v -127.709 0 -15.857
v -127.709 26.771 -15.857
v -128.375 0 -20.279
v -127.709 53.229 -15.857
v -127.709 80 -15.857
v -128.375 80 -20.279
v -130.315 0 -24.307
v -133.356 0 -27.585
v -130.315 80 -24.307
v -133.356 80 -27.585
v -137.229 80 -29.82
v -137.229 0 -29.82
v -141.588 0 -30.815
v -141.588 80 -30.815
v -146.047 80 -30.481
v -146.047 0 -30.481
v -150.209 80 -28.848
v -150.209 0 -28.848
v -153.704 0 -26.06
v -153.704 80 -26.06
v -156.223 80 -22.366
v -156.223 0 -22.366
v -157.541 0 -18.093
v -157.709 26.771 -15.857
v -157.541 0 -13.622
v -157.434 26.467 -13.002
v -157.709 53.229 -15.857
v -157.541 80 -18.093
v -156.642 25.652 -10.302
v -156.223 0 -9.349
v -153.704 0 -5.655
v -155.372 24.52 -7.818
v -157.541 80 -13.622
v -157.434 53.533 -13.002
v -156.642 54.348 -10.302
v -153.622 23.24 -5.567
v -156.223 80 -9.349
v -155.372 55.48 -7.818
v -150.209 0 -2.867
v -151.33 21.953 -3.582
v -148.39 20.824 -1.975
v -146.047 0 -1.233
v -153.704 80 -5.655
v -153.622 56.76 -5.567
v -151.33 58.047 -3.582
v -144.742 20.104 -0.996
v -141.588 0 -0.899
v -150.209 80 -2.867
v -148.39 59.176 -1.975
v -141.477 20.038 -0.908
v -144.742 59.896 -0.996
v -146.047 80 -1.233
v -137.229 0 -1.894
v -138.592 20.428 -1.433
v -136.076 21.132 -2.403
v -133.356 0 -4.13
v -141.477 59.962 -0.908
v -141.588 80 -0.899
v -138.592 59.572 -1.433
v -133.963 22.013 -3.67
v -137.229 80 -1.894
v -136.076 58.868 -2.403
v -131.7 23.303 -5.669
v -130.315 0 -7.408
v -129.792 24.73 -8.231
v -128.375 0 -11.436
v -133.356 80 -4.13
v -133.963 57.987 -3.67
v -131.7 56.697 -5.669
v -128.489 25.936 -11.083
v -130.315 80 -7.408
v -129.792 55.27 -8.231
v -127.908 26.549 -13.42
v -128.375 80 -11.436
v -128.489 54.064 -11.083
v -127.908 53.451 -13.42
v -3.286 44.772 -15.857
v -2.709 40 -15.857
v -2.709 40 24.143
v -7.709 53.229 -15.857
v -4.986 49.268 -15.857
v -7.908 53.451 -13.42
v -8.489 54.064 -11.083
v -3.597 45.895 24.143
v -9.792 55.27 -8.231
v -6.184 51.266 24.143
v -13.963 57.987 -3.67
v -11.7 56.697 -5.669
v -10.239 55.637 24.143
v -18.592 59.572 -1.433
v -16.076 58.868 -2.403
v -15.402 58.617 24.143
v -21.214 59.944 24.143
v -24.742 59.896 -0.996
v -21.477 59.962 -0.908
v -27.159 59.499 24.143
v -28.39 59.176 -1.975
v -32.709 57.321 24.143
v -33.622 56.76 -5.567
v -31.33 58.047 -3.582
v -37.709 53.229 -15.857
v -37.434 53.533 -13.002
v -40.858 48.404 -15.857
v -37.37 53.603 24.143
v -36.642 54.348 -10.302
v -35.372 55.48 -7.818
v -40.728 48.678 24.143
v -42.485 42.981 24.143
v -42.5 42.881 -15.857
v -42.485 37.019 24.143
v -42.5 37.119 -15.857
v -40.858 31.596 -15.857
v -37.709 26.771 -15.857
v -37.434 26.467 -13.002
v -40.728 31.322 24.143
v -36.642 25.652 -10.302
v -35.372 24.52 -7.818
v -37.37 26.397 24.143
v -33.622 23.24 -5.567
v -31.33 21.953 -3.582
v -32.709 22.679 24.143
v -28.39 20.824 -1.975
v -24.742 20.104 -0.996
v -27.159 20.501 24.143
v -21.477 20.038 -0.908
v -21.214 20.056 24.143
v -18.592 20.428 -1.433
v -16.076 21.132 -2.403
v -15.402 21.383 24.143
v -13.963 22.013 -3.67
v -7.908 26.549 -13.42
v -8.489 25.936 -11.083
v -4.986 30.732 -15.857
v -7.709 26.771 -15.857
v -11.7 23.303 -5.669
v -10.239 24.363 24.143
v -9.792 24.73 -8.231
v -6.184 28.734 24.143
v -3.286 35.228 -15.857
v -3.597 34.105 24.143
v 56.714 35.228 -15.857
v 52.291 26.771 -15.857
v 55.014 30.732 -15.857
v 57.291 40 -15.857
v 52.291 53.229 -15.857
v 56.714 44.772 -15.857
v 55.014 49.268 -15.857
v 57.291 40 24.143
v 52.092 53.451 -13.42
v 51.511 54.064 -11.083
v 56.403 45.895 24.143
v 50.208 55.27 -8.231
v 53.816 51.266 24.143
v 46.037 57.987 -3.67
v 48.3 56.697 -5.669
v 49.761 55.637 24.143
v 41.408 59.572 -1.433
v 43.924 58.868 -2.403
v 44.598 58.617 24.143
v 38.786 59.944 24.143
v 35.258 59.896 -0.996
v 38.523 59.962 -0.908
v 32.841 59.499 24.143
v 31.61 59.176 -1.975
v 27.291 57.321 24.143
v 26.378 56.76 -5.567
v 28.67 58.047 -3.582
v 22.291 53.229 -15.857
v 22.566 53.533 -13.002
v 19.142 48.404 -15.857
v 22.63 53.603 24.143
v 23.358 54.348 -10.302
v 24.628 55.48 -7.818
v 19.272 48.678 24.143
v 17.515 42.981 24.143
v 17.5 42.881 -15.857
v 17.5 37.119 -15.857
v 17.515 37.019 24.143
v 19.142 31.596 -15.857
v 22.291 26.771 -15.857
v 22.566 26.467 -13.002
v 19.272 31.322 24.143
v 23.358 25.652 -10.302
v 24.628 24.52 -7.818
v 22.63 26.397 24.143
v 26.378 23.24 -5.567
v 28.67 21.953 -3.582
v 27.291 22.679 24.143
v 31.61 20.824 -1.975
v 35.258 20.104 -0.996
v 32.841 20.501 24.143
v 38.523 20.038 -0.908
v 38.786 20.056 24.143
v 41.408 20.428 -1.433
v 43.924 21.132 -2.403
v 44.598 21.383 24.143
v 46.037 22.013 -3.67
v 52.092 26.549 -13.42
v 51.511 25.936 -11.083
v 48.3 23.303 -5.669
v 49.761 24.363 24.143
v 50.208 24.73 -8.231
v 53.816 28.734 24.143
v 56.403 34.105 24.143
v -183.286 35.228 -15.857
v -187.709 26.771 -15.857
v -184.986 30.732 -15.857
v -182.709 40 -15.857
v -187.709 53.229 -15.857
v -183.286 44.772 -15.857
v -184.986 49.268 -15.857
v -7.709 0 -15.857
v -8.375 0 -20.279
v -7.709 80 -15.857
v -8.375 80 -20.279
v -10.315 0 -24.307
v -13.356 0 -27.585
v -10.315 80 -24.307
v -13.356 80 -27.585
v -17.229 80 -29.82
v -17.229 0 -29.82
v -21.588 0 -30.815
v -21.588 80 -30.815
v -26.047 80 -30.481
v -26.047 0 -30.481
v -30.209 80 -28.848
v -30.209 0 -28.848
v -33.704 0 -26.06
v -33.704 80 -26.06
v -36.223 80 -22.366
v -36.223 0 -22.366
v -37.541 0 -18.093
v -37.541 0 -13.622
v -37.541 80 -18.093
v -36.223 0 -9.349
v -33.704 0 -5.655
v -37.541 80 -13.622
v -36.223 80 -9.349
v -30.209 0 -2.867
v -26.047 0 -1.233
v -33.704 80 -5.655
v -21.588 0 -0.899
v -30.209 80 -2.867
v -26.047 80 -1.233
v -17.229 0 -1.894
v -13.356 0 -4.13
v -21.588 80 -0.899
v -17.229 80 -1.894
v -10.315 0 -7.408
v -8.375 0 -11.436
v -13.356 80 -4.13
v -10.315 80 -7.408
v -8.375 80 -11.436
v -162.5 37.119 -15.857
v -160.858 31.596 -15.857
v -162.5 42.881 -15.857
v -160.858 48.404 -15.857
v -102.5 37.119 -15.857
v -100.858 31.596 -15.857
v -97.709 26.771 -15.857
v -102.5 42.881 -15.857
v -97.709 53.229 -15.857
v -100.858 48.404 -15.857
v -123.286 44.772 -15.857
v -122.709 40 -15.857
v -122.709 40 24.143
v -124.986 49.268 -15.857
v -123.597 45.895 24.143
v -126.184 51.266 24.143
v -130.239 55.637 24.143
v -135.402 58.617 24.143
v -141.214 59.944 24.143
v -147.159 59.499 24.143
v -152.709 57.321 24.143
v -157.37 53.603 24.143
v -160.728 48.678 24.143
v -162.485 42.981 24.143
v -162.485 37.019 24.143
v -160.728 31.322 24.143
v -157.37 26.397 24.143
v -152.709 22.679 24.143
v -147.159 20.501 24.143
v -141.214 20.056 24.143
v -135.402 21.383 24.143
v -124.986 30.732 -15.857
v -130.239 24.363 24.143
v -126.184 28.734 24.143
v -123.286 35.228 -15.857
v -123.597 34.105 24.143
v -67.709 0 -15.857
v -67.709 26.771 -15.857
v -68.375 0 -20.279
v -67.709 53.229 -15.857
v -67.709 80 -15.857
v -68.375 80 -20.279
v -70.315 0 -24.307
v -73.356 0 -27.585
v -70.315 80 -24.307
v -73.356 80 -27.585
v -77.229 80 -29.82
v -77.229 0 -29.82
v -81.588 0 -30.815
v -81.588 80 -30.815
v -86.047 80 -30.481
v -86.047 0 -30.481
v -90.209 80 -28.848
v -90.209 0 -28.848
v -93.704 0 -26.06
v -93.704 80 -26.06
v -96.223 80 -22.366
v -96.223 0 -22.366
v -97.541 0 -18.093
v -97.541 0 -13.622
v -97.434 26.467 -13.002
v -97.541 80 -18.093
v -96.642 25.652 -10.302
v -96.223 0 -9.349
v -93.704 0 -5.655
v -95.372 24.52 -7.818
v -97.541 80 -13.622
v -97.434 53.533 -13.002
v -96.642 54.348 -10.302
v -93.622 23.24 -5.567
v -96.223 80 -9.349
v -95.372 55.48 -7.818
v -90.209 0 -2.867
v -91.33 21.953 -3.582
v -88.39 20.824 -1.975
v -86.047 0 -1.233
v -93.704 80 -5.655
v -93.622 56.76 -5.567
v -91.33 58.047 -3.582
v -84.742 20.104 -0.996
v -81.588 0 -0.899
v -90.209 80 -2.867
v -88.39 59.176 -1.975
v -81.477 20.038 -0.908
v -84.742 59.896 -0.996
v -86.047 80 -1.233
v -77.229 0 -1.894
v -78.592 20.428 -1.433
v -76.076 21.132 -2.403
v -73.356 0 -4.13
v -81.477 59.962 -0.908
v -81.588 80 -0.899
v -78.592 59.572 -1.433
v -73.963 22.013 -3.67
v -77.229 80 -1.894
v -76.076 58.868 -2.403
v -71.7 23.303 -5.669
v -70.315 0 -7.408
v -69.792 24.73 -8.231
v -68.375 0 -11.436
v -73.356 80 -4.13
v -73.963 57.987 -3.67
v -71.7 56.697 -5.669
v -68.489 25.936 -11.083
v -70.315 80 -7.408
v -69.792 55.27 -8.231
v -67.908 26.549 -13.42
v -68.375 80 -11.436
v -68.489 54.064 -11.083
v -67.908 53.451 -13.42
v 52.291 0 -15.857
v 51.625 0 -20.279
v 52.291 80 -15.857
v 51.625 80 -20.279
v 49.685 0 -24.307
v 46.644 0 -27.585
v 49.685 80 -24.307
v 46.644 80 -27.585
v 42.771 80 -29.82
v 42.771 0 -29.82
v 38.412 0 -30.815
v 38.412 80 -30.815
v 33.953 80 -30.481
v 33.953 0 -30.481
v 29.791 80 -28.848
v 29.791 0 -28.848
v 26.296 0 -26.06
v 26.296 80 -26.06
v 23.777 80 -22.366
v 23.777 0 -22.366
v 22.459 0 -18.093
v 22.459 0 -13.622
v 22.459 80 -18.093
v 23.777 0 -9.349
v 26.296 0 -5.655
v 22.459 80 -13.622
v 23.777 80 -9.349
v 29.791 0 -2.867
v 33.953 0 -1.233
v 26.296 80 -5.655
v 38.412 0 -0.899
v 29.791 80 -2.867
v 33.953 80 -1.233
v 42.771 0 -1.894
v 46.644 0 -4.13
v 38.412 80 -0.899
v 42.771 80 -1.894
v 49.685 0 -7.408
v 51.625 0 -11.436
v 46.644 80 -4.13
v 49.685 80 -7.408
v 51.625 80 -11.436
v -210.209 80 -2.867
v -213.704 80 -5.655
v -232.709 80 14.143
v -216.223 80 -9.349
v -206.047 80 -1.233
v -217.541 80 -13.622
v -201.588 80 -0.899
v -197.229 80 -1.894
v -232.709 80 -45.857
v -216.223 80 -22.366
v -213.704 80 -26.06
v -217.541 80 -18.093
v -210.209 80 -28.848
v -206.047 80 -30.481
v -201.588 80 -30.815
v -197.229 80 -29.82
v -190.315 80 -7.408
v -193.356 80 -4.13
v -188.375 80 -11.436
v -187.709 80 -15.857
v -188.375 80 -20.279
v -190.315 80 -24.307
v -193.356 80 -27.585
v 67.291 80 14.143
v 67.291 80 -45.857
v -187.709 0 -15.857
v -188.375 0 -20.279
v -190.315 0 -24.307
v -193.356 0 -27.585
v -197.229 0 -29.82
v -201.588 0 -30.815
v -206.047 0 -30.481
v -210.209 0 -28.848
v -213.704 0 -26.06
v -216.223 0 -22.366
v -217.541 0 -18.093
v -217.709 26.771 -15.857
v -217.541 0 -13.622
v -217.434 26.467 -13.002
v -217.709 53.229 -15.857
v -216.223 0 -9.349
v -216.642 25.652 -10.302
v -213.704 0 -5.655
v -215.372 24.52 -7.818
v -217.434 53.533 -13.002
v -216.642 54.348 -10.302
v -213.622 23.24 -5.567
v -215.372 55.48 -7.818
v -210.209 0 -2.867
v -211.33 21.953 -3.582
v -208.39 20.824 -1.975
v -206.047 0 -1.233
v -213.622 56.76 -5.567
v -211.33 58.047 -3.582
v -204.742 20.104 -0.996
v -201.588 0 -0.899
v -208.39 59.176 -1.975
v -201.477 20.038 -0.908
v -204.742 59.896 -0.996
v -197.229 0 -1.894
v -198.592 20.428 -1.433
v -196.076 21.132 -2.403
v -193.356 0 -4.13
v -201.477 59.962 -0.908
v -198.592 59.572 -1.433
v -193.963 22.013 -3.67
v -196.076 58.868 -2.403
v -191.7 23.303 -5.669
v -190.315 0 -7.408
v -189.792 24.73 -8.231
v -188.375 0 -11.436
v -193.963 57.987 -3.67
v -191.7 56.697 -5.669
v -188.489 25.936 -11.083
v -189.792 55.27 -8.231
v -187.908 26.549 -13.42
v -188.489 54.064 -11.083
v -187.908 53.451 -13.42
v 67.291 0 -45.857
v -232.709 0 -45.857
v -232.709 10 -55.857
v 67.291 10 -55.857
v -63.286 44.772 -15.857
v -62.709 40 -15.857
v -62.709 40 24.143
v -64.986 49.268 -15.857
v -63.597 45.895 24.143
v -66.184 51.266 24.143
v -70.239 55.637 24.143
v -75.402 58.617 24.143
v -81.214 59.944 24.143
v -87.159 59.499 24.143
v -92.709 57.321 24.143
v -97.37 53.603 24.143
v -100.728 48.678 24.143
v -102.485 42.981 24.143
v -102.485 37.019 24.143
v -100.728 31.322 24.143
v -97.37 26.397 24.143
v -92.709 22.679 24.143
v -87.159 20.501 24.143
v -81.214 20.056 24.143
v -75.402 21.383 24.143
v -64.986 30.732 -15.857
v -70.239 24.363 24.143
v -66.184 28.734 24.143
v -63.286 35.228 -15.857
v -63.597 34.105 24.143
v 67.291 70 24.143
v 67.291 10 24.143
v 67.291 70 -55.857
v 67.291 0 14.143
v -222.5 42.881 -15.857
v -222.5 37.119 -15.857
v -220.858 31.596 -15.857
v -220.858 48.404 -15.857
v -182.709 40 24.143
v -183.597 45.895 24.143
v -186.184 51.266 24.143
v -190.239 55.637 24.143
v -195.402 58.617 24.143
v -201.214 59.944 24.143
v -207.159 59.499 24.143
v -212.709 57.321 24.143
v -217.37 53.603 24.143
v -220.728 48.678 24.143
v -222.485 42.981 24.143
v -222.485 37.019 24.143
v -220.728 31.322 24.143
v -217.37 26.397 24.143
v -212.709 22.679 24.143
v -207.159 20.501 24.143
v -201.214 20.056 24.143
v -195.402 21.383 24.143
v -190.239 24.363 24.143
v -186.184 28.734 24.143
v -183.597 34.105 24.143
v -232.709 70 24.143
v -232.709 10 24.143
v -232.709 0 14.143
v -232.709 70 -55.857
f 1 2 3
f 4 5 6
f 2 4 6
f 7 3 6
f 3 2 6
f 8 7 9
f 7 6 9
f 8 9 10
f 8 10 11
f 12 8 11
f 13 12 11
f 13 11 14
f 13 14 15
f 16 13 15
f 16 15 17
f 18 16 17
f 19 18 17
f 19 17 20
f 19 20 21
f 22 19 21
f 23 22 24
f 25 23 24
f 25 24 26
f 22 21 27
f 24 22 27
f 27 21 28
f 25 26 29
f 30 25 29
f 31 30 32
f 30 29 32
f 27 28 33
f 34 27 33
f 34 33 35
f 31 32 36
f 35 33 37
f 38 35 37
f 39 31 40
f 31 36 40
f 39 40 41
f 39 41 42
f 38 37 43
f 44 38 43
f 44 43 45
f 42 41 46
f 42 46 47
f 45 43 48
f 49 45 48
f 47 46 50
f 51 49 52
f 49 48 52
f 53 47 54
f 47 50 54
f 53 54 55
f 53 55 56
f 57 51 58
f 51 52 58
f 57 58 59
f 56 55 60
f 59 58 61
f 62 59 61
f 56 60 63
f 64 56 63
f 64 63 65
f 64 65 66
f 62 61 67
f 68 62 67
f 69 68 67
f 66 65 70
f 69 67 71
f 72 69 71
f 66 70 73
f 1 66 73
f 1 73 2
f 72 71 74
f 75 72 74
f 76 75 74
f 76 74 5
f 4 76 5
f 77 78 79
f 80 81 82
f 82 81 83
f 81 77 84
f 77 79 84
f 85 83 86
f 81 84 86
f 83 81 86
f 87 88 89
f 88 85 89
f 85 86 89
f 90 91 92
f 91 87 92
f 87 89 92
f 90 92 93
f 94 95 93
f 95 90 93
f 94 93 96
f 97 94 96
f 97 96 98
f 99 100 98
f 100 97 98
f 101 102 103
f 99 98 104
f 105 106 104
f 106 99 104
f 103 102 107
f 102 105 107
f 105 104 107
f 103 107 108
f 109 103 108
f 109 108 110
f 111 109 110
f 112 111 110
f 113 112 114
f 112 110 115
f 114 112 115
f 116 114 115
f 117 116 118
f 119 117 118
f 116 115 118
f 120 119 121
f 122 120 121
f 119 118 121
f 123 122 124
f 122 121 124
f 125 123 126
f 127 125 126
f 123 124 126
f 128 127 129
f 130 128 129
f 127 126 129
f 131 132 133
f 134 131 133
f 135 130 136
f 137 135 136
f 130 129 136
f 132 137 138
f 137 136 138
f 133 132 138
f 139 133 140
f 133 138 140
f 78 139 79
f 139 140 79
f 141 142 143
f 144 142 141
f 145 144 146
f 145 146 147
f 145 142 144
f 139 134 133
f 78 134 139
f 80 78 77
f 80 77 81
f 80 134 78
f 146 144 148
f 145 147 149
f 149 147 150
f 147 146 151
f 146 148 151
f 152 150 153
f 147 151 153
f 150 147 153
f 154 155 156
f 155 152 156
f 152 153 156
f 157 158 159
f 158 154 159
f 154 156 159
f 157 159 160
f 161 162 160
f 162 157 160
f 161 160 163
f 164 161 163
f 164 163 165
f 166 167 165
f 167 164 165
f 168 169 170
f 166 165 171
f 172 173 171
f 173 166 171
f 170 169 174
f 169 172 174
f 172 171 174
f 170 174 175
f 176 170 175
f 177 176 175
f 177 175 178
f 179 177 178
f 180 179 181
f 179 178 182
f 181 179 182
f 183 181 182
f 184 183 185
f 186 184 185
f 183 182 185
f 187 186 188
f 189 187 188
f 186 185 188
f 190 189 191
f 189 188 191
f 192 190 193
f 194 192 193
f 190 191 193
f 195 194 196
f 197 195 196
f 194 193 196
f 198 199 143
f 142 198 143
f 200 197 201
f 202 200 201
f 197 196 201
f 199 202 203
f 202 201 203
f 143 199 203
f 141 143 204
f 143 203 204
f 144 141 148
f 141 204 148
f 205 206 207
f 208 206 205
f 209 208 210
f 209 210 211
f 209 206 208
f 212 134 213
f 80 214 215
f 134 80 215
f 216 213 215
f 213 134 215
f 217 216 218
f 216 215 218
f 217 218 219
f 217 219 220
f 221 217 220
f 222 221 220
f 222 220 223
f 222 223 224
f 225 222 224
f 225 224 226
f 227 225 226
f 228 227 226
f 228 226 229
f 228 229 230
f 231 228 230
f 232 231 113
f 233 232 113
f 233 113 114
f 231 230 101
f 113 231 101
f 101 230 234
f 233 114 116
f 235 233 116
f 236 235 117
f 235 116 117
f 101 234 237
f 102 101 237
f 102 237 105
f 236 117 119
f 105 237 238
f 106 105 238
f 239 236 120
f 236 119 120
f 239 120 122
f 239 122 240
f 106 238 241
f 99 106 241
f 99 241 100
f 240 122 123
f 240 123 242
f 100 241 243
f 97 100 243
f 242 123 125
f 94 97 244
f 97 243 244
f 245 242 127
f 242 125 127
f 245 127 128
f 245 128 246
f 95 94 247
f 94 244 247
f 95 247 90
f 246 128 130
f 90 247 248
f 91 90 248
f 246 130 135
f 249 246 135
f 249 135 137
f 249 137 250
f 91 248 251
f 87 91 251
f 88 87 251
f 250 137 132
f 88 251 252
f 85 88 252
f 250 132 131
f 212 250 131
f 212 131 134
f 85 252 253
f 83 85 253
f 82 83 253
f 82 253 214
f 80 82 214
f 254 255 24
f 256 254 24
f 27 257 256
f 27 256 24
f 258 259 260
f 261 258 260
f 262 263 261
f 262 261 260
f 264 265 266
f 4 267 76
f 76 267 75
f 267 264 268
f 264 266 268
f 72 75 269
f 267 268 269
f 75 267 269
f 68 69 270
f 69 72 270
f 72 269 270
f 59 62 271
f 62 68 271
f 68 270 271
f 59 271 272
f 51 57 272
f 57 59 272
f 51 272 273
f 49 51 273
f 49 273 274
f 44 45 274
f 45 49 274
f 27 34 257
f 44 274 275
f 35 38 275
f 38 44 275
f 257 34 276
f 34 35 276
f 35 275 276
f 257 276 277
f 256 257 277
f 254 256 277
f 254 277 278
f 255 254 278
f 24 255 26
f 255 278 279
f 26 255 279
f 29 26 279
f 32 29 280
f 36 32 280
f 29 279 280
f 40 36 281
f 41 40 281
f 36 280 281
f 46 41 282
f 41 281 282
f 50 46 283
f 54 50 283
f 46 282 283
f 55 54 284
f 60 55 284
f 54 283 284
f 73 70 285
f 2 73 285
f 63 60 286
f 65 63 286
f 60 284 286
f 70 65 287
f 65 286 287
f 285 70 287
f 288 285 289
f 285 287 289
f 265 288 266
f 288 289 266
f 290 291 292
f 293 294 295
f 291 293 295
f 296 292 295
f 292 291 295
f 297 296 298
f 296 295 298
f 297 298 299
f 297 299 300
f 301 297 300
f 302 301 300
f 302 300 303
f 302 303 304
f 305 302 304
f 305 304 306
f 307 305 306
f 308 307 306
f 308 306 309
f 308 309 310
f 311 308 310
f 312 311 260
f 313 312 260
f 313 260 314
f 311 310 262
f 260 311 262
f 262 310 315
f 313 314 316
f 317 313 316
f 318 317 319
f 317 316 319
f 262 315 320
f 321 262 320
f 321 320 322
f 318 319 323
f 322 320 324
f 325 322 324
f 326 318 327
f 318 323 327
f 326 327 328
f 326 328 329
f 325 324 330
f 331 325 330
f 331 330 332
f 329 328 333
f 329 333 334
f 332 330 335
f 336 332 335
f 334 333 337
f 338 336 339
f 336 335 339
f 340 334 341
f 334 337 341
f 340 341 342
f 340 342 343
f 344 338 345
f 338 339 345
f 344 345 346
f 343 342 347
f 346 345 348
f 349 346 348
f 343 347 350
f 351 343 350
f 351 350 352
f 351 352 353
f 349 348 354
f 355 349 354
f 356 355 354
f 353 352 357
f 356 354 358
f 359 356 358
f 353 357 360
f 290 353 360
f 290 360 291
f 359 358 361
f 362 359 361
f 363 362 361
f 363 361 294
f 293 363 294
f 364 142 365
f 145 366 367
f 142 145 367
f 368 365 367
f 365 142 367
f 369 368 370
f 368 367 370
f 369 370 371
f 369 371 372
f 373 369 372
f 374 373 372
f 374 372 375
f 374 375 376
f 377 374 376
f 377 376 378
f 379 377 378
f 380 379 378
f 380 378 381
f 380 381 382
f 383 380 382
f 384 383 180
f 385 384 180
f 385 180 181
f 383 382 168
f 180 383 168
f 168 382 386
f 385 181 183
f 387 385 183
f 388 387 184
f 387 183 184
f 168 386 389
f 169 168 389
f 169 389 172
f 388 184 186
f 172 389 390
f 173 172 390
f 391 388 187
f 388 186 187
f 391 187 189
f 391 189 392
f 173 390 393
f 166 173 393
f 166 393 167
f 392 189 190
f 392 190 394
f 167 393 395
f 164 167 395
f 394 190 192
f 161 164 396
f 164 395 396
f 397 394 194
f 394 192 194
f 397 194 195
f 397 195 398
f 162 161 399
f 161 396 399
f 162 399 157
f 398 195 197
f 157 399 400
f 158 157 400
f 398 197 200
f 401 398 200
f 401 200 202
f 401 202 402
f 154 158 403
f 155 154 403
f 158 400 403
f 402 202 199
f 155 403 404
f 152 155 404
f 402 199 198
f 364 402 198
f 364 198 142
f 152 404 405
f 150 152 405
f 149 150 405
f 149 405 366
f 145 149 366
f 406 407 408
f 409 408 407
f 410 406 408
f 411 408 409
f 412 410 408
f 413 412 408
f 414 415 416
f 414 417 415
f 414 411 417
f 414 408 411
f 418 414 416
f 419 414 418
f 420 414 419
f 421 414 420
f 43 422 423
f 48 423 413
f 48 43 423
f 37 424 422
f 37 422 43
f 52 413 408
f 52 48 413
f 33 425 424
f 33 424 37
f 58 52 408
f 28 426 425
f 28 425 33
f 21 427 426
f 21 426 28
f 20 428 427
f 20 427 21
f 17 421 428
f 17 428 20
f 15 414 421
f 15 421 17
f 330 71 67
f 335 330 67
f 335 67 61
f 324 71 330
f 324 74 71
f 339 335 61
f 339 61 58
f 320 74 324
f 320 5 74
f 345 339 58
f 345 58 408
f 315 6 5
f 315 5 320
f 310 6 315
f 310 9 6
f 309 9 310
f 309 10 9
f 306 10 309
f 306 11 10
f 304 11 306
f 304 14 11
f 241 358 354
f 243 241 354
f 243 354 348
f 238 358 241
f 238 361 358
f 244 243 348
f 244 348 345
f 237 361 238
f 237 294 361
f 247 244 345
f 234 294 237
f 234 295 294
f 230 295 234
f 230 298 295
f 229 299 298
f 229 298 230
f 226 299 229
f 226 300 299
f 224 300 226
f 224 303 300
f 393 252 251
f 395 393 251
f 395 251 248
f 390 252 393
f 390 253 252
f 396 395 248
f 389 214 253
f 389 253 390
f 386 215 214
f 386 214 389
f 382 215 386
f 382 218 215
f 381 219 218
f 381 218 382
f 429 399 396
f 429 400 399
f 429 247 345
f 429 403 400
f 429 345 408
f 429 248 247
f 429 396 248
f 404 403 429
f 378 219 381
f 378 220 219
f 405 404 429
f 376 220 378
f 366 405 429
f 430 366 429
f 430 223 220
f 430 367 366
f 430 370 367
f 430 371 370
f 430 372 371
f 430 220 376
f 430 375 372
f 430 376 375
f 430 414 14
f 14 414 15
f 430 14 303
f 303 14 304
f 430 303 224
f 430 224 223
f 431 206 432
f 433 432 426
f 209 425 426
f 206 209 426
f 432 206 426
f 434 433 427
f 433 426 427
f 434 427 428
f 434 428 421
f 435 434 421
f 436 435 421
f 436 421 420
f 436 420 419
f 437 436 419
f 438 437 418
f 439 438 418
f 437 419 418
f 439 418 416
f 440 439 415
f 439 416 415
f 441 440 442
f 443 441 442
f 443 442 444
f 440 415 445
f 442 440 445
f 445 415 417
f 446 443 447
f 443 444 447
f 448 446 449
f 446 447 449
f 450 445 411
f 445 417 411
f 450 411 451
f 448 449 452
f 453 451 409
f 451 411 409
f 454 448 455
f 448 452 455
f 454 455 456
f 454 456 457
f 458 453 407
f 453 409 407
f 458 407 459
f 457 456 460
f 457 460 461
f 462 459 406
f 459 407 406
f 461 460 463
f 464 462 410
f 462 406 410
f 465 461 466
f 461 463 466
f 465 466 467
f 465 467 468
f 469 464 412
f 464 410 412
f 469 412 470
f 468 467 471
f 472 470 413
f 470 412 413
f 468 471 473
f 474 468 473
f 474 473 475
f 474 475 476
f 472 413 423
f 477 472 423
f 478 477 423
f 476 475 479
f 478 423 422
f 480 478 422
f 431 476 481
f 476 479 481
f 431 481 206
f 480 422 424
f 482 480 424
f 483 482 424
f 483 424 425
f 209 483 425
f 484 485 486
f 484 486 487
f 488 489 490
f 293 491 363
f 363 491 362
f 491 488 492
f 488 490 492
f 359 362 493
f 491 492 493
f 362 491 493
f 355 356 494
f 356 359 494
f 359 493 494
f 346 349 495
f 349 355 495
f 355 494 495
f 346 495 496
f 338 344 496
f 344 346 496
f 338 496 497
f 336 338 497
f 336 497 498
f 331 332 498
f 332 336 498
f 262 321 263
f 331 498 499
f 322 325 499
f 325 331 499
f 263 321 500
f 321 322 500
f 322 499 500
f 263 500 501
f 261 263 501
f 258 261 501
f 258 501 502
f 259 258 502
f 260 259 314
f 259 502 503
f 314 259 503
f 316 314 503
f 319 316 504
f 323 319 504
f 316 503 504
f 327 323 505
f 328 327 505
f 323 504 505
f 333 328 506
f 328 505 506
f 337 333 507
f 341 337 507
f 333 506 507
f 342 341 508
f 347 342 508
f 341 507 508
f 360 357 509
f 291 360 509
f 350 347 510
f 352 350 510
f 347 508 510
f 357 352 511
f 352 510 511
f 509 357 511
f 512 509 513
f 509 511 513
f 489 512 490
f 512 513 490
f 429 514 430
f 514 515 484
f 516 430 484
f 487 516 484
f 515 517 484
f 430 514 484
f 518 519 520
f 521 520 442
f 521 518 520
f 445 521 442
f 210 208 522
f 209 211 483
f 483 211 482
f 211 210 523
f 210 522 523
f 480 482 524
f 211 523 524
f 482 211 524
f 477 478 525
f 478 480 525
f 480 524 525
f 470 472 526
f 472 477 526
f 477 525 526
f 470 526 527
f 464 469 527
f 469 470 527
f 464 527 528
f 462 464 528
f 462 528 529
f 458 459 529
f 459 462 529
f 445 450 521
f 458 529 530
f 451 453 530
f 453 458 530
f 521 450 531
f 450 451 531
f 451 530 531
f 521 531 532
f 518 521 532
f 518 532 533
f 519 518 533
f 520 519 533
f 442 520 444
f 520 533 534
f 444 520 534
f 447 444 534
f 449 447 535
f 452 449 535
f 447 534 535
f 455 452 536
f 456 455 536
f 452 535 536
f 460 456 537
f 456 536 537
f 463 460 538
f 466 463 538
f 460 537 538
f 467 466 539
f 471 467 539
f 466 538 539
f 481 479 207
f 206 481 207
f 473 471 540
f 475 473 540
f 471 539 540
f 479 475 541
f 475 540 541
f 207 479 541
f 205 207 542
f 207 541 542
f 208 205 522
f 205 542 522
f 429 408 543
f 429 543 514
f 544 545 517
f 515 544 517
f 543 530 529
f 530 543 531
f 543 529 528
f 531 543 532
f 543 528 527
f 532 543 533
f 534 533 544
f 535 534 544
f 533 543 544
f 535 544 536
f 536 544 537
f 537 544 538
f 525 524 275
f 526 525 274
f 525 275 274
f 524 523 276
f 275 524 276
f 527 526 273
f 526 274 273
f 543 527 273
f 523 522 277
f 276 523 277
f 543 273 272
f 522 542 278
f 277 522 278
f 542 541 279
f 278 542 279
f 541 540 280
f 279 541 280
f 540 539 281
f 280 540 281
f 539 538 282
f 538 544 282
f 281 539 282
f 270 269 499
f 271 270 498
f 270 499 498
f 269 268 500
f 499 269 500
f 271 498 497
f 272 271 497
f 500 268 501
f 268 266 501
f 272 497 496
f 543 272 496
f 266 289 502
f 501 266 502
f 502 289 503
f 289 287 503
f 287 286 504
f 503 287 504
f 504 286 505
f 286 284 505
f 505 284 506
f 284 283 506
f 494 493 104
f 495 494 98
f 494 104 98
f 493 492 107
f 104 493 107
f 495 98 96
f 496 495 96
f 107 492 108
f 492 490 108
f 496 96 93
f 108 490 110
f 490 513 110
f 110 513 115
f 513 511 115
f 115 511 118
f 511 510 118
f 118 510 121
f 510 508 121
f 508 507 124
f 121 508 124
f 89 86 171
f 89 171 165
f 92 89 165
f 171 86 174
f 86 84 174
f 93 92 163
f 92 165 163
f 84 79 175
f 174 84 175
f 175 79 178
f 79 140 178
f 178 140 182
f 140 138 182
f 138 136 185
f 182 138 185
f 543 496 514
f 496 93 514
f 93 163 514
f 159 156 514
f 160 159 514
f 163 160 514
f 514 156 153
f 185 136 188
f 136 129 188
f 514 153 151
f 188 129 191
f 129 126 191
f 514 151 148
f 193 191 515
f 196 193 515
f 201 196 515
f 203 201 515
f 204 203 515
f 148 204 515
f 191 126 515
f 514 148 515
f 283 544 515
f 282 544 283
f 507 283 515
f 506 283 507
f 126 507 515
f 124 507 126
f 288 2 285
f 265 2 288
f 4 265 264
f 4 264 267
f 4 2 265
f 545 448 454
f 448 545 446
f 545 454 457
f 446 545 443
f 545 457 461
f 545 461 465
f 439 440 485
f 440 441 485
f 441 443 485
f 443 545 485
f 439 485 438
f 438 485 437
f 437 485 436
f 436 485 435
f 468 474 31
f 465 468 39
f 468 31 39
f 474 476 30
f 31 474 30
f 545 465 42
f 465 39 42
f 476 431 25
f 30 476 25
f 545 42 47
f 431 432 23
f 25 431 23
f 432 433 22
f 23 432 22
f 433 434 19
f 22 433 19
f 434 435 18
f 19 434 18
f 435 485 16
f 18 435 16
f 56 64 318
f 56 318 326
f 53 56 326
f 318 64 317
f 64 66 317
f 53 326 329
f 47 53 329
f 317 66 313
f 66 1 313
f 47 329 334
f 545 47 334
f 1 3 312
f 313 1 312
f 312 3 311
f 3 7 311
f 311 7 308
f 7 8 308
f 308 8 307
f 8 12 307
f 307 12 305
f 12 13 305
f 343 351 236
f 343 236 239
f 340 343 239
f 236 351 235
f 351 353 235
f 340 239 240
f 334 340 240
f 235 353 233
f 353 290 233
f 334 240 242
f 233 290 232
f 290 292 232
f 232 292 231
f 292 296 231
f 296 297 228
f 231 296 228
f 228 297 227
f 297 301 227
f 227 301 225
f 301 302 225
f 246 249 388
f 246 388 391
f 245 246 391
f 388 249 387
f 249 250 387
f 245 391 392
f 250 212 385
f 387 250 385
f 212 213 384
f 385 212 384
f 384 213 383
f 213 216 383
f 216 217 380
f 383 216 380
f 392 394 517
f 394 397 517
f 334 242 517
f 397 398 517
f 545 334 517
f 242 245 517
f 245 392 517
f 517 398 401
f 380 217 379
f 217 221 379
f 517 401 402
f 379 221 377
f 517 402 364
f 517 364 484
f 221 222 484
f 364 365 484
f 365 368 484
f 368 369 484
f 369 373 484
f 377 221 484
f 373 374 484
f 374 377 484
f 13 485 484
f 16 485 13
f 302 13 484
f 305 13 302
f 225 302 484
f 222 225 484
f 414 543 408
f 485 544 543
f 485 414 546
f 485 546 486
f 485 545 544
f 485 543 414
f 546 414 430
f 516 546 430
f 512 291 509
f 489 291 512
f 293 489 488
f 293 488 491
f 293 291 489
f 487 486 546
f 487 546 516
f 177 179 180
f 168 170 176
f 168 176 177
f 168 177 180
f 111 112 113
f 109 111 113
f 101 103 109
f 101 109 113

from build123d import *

# Parameters (mm, degrees)
CROQUIS1_W              = 300
CROQUIS1_H              = 80
SALIENTE_EXTRUIR1_DEPTH = 80
CHAFL_N1_SIZE           = 10
CROQUIS2_R              = 20
CORTAR_EXTRUIR1_DEPTH   = 40
CROQUIS3_R              = 15
CORTAR_EXTRUIR2_DEPTH   = 100


with BuildPart() as part:
    # Croquis1 → Saliente-Extruir1 (new body)
    with BuildSketch(Plane(origin=(0, 0, 0), x_dir=(1, 0, 0), z_dir=(0, 1, 0))):
        with Locations((-82.708690096, 15.857316294)):
            Rectangle(CROQUIS1_W, CROQUIS1_H)
    extrude(amount=SALIENTE_EXTRUIR1_DEPTH)

    # Chaflán1
    chafl_n1_edges = [part.edges().sort_by_distance(p)[0] for p in [
        (-82.708690096, 80, 24.142683706),
        (-82.708690096, 0, 24.142683706),
        (-82.708690096, 0, -55.857316294),
        (-82.708690096, 80, -55.857316294),
    ]]
    chamfer(chafl_n1_edges, length=CHAFL_N1_SIZE)

    # Croquis2 → Cortar-Extruir1 (cut)
    with BuildSketch(Plane.XY.offset(24.142683706)):
        with Locations((-82.708690096, 40)):
            Circle(CROQUIS2_R)
        with Locations((-142.708690096, 40)):
            Circle(CROQUIS2_R)
        with Locations((-202.708690096, 40)):
            Circle(CROQUIS2_R)
        with Locations((-22.708690096, 40)):
            Circle(CROQUIS2_R)
        with Locations((37.291309904, 40)):
            Circle(CROQUIS2_R)
    extrude(amount=-CORTAR_EXTRUIR1_DEPTH, mode=Mode.SUBTRACT)

    # Croquis3 → Cortar-Extruir2 (cut, symmetric)
    with BuildSketch(Plane(origin=(0, 80, 0), x_dir=(1, 0, 0), z_dir=(0, 1, 0))):
        with Locations((-82.708690096, 15.857316294)):
            Circle(CROQUIS3_R)
        with Locations((-22.708690096, 15.857316294)):
            Circle(CROQUIS3_R)
        with Locations((37.291309904, 15.857316294)):
            Circle(CROQUIS3_R)
        with Locations((-142.708690096, 15.857316294)):
            Circle(CROQUIS3_R)
        with Locations((-202.708690096, 15.857316294)):
            Circle(CROQUIS3_R)
    extrude(amount=CORTAR_EXTRUIR2_DEPTH, both=True, mode=Mode.SUBTRACT)


solid = part.part
